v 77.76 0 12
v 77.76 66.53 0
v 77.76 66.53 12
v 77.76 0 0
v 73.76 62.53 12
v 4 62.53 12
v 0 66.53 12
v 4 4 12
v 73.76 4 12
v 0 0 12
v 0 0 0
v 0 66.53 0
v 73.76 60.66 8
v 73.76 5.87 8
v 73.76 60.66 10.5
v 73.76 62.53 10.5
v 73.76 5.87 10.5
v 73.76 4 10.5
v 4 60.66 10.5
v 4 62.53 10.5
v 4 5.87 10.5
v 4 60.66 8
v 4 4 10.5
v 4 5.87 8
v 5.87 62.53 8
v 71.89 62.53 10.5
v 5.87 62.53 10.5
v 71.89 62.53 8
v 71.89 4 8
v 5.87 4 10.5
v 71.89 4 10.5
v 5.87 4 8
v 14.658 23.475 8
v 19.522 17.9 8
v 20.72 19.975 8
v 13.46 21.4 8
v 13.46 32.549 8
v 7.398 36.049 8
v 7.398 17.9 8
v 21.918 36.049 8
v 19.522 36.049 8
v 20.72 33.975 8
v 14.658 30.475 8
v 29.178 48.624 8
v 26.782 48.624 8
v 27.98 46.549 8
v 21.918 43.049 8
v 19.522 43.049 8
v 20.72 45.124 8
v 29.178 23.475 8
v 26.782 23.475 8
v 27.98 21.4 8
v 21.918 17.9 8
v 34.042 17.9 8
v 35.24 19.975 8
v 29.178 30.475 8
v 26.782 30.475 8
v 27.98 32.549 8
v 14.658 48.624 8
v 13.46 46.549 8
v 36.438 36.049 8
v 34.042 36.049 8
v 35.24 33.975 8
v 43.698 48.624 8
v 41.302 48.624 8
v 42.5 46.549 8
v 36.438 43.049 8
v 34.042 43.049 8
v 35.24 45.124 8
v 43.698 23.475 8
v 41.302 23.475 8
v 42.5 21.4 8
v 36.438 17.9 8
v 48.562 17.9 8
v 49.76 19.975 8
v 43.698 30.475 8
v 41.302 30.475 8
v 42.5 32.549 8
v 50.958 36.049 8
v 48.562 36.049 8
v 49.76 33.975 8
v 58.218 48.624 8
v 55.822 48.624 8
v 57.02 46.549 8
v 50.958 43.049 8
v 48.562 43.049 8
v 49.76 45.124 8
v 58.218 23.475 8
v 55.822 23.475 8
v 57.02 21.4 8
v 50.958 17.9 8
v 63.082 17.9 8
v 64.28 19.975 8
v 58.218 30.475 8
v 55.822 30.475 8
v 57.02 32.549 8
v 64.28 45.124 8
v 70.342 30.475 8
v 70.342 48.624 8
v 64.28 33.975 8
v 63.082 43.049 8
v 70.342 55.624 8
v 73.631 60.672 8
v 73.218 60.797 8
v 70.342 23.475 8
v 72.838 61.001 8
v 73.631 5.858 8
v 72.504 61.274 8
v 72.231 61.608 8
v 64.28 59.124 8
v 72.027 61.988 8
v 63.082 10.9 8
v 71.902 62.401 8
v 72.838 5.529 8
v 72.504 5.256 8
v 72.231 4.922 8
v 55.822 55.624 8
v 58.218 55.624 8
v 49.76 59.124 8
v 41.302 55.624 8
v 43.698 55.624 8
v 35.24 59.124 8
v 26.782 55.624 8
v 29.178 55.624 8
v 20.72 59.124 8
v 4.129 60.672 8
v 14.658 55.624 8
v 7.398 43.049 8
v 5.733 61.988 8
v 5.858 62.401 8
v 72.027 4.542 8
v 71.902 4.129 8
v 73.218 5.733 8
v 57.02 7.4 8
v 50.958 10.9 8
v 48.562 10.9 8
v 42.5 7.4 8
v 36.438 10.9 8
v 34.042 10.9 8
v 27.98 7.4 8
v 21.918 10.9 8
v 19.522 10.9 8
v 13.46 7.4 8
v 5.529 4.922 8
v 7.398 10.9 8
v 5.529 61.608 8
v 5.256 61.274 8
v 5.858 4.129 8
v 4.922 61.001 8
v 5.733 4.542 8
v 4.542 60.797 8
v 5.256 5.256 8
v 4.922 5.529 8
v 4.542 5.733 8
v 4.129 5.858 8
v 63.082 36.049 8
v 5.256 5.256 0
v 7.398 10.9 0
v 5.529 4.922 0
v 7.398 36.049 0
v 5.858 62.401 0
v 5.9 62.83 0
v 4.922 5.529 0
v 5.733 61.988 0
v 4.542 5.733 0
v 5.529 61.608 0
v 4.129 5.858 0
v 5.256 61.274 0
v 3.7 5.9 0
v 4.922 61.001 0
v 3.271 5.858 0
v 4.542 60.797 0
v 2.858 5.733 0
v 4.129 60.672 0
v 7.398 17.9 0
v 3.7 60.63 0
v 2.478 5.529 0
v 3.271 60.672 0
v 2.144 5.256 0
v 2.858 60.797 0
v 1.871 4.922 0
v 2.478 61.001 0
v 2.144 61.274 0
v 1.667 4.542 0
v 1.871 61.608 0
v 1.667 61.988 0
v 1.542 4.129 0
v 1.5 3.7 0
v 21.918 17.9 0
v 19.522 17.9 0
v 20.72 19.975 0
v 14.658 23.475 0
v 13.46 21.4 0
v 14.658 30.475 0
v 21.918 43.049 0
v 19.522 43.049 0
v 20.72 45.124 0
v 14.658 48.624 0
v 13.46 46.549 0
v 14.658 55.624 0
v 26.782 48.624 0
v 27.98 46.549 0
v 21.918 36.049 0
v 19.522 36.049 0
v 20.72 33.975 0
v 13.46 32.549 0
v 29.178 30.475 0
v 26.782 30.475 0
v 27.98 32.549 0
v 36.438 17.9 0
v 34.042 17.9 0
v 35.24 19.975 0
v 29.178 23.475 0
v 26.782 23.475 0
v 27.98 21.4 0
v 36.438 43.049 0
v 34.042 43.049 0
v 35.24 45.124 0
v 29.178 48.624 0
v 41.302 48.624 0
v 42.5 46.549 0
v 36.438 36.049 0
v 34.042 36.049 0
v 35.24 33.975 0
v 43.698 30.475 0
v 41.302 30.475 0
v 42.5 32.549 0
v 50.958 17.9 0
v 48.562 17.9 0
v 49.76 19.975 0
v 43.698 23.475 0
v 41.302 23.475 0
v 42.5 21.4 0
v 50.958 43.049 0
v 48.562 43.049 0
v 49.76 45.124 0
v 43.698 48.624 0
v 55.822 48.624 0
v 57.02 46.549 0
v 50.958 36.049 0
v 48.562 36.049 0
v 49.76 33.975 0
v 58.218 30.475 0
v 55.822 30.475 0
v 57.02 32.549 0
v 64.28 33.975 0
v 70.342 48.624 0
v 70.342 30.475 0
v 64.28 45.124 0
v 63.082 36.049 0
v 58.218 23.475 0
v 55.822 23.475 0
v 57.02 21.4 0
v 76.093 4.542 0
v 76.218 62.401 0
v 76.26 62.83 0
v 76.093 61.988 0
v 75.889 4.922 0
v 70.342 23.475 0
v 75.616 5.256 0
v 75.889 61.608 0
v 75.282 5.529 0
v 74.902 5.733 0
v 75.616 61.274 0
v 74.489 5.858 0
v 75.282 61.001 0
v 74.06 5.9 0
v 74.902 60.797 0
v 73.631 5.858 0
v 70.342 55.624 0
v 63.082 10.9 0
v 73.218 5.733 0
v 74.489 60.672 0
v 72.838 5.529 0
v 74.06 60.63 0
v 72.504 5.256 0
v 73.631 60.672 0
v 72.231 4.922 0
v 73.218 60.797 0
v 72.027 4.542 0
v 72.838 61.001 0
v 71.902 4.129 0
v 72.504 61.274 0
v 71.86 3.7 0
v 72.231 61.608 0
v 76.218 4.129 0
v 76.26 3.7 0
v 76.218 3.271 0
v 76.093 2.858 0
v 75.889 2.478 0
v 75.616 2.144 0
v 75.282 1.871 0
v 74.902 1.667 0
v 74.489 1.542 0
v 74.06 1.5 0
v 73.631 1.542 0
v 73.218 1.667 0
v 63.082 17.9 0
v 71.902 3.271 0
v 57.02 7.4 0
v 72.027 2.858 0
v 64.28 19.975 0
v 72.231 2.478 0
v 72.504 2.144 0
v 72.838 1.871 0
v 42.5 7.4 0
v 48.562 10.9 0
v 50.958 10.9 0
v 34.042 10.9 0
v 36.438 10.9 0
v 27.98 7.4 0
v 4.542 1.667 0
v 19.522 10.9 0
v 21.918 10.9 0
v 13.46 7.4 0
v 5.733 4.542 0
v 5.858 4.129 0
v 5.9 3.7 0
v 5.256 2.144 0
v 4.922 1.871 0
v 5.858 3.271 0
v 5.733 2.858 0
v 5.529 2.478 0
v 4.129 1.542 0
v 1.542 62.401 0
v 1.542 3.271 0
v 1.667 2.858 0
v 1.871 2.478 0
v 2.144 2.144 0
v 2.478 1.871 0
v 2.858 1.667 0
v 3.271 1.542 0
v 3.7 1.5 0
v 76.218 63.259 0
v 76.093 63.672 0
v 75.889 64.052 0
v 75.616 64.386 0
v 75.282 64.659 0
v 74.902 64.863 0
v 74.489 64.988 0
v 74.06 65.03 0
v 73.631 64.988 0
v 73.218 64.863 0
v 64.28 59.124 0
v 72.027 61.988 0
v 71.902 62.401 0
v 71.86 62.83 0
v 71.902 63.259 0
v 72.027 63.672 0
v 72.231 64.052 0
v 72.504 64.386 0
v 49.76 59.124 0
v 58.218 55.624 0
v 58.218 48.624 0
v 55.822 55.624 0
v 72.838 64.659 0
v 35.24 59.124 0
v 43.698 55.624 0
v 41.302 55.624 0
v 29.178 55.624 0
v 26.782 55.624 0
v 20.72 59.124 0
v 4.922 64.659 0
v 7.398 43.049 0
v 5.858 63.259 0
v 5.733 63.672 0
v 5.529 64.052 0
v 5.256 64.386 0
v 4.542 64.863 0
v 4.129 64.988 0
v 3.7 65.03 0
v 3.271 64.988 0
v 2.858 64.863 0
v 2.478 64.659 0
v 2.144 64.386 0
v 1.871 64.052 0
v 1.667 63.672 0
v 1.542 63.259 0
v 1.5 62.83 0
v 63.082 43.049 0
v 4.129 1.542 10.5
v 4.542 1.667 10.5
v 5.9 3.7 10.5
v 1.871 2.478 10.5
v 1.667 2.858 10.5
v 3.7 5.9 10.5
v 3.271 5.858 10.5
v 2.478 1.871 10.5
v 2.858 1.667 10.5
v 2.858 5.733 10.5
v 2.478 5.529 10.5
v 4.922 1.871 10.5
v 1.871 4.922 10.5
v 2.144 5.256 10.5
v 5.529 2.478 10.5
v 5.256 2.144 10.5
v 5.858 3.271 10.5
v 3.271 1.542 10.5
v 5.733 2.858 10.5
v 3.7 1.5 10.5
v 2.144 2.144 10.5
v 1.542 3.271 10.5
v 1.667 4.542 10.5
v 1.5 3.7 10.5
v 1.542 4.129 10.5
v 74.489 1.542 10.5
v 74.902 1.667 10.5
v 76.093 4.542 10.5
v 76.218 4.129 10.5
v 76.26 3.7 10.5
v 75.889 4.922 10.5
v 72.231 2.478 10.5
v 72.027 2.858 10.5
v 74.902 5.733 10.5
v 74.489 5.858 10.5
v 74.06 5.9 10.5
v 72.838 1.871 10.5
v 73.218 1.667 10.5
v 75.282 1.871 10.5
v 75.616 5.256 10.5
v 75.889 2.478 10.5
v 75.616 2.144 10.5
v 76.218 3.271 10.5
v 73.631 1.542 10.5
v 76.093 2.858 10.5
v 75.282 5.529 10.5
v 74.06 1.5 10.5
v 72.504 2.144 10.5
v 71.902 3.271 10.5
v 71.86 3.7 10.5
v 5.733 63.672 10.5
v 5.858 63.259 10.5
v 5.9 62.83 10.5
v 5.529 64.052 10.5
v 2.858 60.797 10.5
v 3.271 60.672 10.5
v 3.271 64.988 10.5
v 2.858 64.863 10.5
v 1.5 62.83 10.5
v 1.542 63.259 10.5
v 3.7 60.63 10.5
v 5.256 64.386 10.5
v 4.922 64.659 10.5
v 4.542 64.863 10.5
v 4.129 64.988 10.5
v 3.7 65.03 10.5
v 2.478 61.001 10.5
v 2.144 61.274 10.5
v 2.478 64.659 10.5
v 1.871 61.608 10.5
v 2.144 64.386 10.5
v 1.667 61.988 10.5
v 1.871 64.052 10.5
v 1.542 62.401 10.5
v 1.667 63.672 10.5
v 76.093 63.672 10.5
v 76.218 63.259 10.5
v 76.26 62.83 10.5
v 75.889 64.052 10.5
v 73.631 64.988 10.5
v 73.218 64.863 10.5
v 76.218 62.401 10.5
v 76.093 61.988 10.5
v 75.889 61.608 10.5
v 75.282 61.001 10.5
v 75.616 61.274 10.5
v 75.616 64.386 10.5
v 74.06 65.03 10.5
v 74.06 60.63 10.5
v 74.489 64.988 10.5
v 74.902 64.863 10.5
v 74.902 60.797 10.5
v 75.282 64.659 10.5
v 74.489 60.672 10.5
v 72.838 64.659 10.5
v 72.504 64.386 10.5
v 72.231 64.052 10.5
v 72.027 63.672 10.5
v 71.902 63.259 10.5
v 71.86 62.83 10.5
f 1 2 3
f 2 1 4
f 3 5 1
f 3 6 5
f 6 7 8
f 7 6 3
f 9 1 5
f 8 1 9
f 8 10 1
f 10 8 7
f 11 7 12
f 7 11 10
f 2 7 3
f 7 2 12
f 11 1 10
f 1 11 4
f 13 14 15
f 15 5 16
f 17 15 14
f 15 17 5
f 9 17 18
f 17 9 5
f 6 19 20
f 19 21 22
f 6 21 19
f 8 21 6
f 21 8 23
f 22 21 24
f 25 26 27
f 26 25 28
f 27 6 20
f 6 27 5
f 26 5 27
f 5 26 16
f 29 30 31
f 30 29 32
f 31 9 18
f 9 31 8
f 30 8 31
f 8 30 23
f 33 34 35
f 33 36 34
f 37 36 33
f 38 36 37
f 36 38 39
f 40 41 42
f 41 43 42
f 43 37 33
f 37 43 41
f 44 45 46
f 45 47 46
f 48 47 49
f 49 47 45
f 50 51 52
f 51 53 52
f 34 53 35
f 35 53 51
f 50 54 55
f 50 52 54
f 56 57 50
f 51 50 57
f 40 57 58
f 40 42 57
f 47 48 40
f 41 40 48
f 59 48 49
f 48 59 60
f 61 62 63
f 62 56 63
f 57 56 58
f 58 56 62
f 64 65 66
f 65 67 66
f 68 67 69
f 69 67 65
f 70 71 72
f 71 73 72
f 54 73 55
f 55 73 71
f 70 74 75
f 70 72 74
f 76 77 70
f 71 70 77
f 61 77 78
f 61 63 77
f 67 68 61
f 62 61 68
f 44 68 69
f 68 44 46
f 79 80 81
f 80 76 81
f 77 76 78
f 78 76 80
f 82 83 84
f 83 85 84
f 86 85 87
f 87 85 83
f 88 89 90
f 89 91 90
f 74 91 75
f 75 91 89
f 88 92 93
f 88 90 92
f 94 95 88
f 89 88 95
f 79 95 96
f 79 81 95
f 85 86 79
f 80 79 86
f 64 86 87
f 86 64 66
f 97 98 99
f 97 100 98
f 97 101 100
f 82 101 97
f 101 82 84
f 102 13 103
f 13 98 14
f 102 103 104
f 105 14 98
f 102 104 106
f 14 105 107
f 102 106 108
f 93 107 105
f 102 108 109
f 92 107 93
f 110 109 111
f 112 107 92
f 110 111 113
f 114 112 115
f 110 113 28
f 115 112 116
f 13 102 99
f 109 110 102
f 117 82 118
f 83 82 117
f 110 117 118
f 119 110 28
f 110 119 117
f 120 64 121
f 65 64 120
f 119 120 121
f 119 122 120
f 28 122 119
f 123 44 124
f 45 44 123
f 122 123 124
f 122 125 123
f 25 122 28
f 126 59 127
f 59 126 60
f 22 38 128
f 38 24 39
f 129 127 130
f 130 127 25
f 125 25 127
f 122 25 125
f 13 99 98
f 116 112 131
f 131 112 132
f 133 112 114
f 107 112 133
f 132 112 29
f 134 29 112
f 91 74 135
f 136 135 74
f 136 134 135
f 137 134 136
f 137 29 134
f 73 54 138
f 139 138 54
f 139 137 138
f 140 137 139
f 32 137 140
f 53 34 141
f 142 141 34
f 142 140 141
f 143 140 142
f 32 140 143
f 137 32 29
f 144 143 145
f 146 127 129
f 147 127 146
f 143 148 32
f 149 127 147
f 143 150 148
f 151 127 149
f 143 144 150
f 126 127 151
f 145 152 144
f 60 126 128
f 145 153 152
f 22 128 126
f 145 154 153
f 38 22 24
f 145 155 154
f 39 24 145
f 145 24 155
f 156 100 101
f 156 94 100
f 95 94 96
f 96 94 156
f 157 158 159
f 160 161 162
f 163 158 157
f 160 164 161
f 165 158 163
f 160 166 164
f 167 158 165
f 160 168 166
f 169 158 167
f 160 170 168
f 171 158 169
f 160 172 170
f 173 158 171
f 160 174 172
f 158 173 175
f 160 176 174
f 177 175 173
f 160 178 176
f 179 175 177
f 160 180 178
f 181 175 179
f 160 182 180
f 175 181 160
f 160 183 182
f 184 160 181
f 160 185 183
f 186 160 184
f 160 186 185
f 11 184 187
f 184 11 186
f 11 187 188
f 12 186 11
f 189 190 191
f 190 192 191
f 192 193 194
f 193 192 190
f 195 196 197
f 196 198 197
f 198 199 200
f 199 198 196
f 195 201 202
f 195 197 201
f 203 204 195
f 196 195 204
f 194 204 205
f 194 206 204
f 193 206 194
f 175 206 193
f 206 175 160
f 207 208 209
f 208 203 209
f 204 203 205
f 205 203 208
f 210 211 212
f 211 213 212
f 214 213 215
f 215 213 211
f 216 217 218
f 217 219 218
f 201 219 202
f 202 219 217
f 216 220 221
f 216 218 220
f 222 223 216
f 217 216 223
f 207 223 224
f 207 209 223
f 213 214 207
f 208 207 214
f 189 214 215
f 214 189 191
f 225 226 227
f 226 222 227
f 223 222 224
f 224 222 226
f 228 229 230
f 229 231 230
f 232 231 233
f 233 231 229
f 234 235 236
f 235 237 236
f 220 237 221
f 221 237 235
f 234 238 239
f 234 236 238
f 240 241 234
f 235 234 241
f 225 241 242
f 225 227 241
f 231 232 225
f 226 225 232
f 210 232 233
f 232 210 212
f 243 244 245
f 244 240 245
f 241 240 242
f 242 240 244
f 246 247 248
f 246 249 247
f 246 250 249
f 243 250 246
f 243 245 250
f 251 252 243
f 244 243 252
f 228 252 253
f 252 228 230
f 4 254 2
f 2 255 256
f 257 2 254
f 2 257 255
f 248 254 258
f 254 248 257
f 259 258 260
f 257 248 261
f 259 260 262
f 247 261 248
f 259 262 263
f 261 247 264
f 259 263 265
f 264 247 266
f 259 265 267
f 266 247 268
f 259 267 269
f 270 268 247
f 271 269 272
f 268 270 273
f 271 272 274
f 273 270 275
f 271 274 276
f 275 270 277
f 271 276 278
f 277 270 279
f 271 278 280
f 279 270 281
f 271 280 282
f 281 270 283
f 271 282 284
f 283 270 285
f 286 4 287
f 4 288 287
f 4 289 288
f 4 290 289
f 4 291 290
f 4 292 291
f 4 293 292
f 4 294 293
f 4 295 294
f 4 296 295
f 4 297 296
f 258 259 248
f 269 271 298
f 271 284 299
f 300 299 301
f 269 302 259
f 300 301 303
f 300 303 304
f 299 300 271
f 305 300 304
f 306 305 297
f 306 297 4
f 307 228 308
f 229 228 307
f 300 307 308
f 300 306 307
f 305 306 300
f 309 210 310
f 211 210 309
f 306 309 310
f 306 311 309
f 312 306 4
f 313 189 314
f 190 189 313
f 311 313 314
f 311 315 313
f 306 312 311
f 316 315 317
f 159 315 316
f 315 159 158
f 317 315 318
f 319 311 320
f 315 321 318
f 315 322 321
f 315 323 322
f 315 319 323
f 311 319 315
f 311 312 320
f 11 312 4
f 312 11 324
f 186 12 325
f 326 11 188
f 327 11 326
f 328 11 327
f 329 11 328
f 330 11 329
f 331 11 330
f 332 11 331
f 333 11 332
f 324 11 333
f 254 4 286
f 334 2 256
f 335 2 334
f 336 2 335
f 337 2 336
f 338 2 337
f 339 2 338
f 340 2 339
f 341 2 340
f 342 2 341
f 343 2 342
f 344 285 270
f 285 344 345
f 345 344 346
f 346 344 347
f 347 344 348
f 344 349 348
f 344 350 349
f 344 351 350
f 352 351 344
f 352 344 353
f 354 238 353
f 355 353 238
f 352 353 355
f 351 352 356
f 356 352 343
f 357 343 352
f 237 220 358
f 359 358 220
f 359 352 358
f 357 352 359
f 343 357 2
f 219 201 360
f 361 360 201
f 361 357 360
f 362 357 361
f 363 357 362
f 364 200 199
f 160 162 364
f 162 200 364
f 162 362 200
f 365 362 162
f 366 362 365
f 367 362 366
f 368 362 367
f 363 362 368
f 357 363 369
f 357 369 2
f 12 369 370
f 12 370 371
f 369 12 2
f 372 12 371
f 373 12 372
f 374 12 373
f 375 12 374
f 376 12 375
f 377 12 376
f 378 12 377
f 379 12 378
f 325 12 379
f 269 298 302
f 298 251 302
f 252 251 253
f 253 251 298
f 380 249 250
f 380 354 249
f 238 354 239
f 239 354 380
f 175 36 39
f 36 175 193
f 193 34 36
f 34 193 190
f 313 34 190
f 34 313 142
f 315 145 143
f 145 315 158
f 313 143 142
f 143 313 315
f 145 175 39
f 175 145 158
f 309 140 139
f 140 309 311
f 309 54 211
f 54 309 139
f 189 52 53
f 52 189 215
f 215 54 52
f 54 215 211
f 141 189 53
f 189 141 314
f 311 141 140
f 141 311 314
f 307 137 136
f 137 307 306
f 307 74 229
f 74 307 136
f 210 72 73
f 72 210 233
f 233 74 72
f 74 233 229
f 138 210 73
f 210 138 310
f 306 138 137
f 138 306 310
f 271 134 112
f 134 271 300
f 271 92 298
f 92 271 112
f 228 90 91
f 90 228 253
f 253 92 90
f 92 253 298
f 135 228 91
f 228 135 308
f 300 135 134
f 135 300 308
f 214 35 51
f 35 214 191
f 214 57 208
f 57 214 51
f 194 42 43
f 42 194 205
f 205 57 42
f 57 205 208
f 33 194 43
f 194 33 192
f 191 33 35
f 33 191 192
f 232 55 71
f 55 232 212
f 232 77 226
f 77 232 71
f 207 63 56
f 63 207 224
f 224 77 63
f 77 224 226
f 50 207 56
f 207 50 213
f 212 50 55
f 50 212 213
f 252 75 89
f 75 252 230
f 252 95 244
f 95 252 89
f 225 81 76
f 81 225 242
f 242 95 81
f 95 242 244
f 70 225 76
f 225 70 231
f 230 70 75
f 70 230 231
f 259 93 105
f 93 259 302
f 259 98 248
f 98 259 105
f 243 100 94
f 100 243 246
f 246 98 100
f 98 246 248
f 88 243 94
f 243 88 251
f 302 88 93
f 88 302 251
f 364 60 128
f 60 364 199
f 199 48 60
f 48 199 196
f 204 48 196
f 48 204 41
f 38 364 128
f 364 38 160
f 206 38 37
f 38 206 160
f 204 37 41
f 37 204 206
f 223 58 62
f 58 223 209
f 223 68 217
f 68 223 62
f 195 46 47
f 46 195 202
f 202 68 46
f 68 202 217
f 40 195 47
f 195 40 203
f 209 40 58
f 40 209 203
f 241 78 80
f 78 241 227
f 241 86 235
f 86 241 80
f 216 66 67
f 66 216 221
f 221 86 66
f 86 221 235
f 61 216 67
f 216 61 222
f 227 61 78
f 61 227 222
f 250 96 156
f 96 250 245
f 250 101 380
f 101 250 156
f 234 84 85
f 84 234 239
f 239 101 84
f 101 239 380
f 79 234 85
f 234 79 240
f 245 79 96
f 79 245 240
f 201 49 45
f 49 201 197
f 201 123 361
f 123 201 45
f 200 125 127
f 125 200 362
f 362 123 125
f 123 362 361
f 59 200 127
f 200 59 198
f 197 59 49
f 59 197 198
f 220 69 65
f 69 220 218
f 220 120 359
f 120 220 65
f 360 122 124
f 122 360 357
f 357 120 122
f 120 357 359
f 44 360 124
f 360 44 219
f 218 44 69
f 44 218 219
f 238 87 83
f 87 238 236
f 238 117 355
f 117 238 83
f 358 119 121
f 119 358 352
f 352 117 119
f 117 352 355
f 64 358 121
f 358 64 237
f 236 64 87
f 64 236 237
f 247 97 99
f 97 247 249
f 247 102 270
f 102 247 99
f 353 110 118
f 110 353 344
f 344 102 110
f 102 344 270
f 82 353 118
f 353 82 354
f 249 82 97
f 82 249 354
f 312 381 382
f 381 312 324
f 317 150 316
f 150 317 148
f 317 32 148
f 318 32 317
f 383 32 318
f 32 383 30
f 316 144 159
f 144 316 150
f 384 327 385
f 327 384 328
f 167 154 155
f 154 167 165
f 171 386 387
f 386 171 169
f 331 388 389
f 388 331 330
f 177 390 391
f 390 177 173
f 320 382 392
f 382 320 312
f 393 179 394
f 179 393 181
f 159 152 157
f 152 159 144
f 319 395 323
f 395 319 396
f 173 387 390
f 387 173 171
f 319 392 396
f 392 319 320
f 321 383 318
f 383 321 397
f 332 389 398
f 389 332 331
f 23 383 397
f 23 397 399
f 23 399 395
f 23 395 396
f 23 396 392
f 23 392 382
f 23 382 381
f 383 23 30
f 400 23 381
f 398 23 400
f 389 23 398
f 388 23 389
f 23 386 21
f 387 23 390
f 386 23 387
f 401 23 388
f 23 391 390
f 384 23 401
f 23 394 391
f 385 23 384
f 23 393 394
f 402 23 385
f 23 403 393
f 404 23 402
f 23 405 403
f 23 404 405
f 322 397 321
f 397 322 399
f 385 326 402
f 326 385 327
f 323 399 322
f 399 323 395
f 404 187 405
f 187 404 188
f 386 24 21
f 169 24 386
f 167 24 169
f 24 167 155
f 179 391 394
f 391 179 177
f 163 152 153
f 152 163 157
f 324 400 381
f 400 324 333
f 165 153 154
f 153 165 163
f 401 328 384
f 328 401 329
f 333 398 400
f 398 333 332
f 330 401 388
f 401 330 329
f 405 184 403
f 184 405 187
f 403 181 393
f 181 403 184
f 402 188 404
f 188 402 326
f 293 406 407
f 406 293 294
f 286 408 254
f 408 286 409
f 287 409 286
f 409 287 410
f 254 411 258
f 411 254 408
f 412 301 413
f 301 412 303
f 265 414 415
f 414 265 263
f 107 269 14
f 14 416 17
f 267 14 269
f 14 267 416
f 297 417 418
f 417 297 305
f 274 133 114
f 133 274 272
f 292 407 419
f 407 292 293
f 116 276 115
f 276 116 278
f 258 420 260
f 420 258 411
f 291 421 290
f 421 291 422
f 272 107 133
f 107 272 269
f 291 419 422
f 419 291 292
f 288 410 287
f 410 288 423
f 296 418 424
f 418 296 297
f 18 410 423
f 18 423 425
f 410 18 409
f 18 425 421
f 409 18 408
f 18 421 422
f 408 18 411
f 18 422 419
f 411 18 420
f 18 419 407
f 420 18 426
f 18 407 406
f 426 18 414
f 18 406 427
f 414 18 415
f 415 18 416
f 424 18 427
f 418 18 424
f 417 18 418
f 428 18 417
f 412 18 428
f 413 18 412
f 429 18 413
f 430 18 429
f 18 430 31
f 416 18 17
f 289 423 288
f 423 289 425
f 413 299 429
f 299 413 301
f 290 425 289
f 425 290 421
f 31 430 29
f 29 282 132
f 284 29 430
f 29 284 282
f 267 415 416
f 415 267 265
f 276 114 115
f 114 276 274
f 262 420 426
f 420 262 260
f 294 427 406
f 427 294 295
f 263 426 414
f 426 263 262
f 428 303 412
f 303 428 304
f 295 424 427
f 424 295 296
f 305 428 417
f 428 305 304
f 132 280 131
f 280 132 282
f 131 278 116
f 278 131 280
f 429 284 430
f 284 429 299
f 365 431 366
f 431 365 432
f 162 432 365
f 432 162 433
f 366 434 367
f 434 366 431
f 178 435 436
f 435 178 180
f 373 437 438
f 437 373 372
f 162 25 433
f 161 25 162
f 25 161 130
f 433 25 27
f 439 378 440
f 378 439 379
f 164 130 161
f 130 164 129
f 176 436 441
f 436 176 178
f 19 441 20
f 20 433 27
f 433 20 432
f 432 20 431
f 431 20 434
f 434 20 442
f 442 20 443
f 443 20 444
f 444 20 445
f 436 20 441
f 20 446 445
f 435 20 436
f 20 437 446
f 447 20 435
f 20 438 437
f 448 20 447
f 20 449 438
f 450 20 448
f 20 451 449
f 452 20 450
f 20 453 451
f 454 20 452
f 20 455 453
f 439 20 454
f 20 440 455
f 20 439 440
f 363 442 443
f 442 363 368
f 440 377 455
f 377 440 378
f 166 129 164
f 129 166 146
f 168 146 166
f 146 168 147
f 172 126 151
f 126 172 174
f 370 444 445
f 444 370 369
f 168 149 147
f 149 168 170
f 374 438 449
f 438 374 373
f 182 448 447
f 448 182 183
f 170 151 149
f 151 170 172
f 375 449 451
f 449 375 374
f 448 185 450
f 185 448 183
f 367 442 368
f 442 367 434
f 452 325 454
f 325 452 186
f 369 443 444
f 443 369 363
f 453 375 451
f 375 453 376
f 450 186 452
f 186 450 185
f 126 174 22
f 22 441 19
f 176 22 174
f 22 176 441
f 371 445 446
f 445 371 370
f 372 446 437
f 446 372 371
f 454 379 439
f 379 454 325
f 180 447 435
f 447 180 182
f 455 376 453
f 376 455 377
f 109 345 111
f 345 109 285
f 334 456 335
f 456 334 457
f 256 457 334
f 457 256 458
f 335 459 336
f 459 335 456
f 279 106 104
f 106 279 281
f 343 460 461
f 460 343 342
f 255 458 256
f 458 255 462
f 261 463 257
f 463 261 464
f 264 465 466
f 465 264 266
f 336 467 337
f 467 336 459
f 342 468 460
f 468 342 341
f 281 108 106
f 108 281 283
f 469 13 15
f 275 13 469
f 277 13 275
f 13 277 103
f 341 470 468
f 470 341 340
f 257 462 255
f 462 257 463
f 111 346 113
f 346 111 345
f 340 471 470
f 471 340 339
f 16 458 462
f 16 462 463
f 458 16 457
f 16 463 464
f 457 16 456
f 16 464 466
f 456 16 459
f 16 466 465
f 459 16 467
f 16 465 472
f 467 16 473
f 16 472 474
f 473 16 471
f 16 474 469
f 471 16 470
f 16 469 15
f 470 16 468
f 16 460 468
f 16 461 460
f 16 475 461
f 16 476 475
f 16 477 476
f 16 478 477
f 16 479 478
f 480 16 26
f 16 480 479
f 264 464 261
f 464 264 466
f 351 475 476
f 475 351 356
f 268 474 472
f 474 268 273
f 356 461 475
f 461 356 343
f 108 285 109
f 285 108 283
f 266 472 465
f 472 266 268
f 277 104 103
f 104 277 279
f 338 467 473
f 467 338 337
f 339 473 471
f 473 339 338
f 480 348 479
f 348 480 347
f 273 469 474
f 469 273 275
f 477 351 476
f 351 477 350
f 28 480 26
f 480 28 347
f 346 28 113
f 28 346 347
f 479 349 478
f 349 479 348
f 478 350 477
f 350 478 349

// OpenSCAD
$fn = 32;

// ----------------------------------------------------------------------
// Honeycomb panel: 77.76 x 66.53 mm, 16 cells of 14 mm
// ----------------------------------------------------------------------

// --- parameters (mm) ---
panel_w = 77.76;          // panel width
panel_d = 66.53;          // panel depth
thick = 8;                // panel thickness
cell_r = 7;               // hex cell circumradius
pitch = 14.52;            // hex cell pitch (centre to centre)
web = 2.4;                // web between the cells
columns = 4;              // columns of cells
rows = 4;                 // rows of cells
cell_count = 16;          // total cells
shift_x = 13.46;          // first cell offset in x
shift_y = 14.4;           // first cell offset in y
mount_d = 4.4;            // corner mounting holes
hole_off = 3.7;           // mounting hole offset from the corners
rim_h = 12;               // rim height
rim_t = 4;                // rim wall thickness

difference() {
  union() {
    cube([panel_w, panel_d, thick]);
    /* rim around the panel, sunk 1 mm into the plate */
    translate([0, 0, thick - 1]) difference() {
      cube([panel_w, panel_d, rim_h - thick + 1]);
      translate([rim_t, rim_t, -2.5]) cube([panel_w - 2 * rim_t, panel_d - 2 * rim_t, rim_h - thick + 6]);
    }
  }
  /* hexagonal cells, point-up, cut right through the plate */
  for (row = [0 : rows - 1]) {
    for (col = [0 : columns - 1]) {
      translate([shift_x + col * pitch + (row % 2) * pitch / 2, shift_y + row * pitch * 0.866025, -2.5]) rotate([0, 0, 30]) cylinder(h = thick + 5, d = 2 * cell_r, $fn = 6);
    }
  }
  /* corner mounting holes, clear of the outer cell web */
  translate([3.7, 3.7, -2.5]) cylinder(h = thick + 5, d = mount_d);
  translate([74.06, 3.7, -2.5]) cylinder(h = thick + 5, d = mount_d);
  translate([3.7, 62.83, -2.5]) cylinder(h = thick + 5, d = mount_d);
  translate([74.06, 62.83, -2.5]) cylinder(h = thick + 5, d = mount_d);
}
